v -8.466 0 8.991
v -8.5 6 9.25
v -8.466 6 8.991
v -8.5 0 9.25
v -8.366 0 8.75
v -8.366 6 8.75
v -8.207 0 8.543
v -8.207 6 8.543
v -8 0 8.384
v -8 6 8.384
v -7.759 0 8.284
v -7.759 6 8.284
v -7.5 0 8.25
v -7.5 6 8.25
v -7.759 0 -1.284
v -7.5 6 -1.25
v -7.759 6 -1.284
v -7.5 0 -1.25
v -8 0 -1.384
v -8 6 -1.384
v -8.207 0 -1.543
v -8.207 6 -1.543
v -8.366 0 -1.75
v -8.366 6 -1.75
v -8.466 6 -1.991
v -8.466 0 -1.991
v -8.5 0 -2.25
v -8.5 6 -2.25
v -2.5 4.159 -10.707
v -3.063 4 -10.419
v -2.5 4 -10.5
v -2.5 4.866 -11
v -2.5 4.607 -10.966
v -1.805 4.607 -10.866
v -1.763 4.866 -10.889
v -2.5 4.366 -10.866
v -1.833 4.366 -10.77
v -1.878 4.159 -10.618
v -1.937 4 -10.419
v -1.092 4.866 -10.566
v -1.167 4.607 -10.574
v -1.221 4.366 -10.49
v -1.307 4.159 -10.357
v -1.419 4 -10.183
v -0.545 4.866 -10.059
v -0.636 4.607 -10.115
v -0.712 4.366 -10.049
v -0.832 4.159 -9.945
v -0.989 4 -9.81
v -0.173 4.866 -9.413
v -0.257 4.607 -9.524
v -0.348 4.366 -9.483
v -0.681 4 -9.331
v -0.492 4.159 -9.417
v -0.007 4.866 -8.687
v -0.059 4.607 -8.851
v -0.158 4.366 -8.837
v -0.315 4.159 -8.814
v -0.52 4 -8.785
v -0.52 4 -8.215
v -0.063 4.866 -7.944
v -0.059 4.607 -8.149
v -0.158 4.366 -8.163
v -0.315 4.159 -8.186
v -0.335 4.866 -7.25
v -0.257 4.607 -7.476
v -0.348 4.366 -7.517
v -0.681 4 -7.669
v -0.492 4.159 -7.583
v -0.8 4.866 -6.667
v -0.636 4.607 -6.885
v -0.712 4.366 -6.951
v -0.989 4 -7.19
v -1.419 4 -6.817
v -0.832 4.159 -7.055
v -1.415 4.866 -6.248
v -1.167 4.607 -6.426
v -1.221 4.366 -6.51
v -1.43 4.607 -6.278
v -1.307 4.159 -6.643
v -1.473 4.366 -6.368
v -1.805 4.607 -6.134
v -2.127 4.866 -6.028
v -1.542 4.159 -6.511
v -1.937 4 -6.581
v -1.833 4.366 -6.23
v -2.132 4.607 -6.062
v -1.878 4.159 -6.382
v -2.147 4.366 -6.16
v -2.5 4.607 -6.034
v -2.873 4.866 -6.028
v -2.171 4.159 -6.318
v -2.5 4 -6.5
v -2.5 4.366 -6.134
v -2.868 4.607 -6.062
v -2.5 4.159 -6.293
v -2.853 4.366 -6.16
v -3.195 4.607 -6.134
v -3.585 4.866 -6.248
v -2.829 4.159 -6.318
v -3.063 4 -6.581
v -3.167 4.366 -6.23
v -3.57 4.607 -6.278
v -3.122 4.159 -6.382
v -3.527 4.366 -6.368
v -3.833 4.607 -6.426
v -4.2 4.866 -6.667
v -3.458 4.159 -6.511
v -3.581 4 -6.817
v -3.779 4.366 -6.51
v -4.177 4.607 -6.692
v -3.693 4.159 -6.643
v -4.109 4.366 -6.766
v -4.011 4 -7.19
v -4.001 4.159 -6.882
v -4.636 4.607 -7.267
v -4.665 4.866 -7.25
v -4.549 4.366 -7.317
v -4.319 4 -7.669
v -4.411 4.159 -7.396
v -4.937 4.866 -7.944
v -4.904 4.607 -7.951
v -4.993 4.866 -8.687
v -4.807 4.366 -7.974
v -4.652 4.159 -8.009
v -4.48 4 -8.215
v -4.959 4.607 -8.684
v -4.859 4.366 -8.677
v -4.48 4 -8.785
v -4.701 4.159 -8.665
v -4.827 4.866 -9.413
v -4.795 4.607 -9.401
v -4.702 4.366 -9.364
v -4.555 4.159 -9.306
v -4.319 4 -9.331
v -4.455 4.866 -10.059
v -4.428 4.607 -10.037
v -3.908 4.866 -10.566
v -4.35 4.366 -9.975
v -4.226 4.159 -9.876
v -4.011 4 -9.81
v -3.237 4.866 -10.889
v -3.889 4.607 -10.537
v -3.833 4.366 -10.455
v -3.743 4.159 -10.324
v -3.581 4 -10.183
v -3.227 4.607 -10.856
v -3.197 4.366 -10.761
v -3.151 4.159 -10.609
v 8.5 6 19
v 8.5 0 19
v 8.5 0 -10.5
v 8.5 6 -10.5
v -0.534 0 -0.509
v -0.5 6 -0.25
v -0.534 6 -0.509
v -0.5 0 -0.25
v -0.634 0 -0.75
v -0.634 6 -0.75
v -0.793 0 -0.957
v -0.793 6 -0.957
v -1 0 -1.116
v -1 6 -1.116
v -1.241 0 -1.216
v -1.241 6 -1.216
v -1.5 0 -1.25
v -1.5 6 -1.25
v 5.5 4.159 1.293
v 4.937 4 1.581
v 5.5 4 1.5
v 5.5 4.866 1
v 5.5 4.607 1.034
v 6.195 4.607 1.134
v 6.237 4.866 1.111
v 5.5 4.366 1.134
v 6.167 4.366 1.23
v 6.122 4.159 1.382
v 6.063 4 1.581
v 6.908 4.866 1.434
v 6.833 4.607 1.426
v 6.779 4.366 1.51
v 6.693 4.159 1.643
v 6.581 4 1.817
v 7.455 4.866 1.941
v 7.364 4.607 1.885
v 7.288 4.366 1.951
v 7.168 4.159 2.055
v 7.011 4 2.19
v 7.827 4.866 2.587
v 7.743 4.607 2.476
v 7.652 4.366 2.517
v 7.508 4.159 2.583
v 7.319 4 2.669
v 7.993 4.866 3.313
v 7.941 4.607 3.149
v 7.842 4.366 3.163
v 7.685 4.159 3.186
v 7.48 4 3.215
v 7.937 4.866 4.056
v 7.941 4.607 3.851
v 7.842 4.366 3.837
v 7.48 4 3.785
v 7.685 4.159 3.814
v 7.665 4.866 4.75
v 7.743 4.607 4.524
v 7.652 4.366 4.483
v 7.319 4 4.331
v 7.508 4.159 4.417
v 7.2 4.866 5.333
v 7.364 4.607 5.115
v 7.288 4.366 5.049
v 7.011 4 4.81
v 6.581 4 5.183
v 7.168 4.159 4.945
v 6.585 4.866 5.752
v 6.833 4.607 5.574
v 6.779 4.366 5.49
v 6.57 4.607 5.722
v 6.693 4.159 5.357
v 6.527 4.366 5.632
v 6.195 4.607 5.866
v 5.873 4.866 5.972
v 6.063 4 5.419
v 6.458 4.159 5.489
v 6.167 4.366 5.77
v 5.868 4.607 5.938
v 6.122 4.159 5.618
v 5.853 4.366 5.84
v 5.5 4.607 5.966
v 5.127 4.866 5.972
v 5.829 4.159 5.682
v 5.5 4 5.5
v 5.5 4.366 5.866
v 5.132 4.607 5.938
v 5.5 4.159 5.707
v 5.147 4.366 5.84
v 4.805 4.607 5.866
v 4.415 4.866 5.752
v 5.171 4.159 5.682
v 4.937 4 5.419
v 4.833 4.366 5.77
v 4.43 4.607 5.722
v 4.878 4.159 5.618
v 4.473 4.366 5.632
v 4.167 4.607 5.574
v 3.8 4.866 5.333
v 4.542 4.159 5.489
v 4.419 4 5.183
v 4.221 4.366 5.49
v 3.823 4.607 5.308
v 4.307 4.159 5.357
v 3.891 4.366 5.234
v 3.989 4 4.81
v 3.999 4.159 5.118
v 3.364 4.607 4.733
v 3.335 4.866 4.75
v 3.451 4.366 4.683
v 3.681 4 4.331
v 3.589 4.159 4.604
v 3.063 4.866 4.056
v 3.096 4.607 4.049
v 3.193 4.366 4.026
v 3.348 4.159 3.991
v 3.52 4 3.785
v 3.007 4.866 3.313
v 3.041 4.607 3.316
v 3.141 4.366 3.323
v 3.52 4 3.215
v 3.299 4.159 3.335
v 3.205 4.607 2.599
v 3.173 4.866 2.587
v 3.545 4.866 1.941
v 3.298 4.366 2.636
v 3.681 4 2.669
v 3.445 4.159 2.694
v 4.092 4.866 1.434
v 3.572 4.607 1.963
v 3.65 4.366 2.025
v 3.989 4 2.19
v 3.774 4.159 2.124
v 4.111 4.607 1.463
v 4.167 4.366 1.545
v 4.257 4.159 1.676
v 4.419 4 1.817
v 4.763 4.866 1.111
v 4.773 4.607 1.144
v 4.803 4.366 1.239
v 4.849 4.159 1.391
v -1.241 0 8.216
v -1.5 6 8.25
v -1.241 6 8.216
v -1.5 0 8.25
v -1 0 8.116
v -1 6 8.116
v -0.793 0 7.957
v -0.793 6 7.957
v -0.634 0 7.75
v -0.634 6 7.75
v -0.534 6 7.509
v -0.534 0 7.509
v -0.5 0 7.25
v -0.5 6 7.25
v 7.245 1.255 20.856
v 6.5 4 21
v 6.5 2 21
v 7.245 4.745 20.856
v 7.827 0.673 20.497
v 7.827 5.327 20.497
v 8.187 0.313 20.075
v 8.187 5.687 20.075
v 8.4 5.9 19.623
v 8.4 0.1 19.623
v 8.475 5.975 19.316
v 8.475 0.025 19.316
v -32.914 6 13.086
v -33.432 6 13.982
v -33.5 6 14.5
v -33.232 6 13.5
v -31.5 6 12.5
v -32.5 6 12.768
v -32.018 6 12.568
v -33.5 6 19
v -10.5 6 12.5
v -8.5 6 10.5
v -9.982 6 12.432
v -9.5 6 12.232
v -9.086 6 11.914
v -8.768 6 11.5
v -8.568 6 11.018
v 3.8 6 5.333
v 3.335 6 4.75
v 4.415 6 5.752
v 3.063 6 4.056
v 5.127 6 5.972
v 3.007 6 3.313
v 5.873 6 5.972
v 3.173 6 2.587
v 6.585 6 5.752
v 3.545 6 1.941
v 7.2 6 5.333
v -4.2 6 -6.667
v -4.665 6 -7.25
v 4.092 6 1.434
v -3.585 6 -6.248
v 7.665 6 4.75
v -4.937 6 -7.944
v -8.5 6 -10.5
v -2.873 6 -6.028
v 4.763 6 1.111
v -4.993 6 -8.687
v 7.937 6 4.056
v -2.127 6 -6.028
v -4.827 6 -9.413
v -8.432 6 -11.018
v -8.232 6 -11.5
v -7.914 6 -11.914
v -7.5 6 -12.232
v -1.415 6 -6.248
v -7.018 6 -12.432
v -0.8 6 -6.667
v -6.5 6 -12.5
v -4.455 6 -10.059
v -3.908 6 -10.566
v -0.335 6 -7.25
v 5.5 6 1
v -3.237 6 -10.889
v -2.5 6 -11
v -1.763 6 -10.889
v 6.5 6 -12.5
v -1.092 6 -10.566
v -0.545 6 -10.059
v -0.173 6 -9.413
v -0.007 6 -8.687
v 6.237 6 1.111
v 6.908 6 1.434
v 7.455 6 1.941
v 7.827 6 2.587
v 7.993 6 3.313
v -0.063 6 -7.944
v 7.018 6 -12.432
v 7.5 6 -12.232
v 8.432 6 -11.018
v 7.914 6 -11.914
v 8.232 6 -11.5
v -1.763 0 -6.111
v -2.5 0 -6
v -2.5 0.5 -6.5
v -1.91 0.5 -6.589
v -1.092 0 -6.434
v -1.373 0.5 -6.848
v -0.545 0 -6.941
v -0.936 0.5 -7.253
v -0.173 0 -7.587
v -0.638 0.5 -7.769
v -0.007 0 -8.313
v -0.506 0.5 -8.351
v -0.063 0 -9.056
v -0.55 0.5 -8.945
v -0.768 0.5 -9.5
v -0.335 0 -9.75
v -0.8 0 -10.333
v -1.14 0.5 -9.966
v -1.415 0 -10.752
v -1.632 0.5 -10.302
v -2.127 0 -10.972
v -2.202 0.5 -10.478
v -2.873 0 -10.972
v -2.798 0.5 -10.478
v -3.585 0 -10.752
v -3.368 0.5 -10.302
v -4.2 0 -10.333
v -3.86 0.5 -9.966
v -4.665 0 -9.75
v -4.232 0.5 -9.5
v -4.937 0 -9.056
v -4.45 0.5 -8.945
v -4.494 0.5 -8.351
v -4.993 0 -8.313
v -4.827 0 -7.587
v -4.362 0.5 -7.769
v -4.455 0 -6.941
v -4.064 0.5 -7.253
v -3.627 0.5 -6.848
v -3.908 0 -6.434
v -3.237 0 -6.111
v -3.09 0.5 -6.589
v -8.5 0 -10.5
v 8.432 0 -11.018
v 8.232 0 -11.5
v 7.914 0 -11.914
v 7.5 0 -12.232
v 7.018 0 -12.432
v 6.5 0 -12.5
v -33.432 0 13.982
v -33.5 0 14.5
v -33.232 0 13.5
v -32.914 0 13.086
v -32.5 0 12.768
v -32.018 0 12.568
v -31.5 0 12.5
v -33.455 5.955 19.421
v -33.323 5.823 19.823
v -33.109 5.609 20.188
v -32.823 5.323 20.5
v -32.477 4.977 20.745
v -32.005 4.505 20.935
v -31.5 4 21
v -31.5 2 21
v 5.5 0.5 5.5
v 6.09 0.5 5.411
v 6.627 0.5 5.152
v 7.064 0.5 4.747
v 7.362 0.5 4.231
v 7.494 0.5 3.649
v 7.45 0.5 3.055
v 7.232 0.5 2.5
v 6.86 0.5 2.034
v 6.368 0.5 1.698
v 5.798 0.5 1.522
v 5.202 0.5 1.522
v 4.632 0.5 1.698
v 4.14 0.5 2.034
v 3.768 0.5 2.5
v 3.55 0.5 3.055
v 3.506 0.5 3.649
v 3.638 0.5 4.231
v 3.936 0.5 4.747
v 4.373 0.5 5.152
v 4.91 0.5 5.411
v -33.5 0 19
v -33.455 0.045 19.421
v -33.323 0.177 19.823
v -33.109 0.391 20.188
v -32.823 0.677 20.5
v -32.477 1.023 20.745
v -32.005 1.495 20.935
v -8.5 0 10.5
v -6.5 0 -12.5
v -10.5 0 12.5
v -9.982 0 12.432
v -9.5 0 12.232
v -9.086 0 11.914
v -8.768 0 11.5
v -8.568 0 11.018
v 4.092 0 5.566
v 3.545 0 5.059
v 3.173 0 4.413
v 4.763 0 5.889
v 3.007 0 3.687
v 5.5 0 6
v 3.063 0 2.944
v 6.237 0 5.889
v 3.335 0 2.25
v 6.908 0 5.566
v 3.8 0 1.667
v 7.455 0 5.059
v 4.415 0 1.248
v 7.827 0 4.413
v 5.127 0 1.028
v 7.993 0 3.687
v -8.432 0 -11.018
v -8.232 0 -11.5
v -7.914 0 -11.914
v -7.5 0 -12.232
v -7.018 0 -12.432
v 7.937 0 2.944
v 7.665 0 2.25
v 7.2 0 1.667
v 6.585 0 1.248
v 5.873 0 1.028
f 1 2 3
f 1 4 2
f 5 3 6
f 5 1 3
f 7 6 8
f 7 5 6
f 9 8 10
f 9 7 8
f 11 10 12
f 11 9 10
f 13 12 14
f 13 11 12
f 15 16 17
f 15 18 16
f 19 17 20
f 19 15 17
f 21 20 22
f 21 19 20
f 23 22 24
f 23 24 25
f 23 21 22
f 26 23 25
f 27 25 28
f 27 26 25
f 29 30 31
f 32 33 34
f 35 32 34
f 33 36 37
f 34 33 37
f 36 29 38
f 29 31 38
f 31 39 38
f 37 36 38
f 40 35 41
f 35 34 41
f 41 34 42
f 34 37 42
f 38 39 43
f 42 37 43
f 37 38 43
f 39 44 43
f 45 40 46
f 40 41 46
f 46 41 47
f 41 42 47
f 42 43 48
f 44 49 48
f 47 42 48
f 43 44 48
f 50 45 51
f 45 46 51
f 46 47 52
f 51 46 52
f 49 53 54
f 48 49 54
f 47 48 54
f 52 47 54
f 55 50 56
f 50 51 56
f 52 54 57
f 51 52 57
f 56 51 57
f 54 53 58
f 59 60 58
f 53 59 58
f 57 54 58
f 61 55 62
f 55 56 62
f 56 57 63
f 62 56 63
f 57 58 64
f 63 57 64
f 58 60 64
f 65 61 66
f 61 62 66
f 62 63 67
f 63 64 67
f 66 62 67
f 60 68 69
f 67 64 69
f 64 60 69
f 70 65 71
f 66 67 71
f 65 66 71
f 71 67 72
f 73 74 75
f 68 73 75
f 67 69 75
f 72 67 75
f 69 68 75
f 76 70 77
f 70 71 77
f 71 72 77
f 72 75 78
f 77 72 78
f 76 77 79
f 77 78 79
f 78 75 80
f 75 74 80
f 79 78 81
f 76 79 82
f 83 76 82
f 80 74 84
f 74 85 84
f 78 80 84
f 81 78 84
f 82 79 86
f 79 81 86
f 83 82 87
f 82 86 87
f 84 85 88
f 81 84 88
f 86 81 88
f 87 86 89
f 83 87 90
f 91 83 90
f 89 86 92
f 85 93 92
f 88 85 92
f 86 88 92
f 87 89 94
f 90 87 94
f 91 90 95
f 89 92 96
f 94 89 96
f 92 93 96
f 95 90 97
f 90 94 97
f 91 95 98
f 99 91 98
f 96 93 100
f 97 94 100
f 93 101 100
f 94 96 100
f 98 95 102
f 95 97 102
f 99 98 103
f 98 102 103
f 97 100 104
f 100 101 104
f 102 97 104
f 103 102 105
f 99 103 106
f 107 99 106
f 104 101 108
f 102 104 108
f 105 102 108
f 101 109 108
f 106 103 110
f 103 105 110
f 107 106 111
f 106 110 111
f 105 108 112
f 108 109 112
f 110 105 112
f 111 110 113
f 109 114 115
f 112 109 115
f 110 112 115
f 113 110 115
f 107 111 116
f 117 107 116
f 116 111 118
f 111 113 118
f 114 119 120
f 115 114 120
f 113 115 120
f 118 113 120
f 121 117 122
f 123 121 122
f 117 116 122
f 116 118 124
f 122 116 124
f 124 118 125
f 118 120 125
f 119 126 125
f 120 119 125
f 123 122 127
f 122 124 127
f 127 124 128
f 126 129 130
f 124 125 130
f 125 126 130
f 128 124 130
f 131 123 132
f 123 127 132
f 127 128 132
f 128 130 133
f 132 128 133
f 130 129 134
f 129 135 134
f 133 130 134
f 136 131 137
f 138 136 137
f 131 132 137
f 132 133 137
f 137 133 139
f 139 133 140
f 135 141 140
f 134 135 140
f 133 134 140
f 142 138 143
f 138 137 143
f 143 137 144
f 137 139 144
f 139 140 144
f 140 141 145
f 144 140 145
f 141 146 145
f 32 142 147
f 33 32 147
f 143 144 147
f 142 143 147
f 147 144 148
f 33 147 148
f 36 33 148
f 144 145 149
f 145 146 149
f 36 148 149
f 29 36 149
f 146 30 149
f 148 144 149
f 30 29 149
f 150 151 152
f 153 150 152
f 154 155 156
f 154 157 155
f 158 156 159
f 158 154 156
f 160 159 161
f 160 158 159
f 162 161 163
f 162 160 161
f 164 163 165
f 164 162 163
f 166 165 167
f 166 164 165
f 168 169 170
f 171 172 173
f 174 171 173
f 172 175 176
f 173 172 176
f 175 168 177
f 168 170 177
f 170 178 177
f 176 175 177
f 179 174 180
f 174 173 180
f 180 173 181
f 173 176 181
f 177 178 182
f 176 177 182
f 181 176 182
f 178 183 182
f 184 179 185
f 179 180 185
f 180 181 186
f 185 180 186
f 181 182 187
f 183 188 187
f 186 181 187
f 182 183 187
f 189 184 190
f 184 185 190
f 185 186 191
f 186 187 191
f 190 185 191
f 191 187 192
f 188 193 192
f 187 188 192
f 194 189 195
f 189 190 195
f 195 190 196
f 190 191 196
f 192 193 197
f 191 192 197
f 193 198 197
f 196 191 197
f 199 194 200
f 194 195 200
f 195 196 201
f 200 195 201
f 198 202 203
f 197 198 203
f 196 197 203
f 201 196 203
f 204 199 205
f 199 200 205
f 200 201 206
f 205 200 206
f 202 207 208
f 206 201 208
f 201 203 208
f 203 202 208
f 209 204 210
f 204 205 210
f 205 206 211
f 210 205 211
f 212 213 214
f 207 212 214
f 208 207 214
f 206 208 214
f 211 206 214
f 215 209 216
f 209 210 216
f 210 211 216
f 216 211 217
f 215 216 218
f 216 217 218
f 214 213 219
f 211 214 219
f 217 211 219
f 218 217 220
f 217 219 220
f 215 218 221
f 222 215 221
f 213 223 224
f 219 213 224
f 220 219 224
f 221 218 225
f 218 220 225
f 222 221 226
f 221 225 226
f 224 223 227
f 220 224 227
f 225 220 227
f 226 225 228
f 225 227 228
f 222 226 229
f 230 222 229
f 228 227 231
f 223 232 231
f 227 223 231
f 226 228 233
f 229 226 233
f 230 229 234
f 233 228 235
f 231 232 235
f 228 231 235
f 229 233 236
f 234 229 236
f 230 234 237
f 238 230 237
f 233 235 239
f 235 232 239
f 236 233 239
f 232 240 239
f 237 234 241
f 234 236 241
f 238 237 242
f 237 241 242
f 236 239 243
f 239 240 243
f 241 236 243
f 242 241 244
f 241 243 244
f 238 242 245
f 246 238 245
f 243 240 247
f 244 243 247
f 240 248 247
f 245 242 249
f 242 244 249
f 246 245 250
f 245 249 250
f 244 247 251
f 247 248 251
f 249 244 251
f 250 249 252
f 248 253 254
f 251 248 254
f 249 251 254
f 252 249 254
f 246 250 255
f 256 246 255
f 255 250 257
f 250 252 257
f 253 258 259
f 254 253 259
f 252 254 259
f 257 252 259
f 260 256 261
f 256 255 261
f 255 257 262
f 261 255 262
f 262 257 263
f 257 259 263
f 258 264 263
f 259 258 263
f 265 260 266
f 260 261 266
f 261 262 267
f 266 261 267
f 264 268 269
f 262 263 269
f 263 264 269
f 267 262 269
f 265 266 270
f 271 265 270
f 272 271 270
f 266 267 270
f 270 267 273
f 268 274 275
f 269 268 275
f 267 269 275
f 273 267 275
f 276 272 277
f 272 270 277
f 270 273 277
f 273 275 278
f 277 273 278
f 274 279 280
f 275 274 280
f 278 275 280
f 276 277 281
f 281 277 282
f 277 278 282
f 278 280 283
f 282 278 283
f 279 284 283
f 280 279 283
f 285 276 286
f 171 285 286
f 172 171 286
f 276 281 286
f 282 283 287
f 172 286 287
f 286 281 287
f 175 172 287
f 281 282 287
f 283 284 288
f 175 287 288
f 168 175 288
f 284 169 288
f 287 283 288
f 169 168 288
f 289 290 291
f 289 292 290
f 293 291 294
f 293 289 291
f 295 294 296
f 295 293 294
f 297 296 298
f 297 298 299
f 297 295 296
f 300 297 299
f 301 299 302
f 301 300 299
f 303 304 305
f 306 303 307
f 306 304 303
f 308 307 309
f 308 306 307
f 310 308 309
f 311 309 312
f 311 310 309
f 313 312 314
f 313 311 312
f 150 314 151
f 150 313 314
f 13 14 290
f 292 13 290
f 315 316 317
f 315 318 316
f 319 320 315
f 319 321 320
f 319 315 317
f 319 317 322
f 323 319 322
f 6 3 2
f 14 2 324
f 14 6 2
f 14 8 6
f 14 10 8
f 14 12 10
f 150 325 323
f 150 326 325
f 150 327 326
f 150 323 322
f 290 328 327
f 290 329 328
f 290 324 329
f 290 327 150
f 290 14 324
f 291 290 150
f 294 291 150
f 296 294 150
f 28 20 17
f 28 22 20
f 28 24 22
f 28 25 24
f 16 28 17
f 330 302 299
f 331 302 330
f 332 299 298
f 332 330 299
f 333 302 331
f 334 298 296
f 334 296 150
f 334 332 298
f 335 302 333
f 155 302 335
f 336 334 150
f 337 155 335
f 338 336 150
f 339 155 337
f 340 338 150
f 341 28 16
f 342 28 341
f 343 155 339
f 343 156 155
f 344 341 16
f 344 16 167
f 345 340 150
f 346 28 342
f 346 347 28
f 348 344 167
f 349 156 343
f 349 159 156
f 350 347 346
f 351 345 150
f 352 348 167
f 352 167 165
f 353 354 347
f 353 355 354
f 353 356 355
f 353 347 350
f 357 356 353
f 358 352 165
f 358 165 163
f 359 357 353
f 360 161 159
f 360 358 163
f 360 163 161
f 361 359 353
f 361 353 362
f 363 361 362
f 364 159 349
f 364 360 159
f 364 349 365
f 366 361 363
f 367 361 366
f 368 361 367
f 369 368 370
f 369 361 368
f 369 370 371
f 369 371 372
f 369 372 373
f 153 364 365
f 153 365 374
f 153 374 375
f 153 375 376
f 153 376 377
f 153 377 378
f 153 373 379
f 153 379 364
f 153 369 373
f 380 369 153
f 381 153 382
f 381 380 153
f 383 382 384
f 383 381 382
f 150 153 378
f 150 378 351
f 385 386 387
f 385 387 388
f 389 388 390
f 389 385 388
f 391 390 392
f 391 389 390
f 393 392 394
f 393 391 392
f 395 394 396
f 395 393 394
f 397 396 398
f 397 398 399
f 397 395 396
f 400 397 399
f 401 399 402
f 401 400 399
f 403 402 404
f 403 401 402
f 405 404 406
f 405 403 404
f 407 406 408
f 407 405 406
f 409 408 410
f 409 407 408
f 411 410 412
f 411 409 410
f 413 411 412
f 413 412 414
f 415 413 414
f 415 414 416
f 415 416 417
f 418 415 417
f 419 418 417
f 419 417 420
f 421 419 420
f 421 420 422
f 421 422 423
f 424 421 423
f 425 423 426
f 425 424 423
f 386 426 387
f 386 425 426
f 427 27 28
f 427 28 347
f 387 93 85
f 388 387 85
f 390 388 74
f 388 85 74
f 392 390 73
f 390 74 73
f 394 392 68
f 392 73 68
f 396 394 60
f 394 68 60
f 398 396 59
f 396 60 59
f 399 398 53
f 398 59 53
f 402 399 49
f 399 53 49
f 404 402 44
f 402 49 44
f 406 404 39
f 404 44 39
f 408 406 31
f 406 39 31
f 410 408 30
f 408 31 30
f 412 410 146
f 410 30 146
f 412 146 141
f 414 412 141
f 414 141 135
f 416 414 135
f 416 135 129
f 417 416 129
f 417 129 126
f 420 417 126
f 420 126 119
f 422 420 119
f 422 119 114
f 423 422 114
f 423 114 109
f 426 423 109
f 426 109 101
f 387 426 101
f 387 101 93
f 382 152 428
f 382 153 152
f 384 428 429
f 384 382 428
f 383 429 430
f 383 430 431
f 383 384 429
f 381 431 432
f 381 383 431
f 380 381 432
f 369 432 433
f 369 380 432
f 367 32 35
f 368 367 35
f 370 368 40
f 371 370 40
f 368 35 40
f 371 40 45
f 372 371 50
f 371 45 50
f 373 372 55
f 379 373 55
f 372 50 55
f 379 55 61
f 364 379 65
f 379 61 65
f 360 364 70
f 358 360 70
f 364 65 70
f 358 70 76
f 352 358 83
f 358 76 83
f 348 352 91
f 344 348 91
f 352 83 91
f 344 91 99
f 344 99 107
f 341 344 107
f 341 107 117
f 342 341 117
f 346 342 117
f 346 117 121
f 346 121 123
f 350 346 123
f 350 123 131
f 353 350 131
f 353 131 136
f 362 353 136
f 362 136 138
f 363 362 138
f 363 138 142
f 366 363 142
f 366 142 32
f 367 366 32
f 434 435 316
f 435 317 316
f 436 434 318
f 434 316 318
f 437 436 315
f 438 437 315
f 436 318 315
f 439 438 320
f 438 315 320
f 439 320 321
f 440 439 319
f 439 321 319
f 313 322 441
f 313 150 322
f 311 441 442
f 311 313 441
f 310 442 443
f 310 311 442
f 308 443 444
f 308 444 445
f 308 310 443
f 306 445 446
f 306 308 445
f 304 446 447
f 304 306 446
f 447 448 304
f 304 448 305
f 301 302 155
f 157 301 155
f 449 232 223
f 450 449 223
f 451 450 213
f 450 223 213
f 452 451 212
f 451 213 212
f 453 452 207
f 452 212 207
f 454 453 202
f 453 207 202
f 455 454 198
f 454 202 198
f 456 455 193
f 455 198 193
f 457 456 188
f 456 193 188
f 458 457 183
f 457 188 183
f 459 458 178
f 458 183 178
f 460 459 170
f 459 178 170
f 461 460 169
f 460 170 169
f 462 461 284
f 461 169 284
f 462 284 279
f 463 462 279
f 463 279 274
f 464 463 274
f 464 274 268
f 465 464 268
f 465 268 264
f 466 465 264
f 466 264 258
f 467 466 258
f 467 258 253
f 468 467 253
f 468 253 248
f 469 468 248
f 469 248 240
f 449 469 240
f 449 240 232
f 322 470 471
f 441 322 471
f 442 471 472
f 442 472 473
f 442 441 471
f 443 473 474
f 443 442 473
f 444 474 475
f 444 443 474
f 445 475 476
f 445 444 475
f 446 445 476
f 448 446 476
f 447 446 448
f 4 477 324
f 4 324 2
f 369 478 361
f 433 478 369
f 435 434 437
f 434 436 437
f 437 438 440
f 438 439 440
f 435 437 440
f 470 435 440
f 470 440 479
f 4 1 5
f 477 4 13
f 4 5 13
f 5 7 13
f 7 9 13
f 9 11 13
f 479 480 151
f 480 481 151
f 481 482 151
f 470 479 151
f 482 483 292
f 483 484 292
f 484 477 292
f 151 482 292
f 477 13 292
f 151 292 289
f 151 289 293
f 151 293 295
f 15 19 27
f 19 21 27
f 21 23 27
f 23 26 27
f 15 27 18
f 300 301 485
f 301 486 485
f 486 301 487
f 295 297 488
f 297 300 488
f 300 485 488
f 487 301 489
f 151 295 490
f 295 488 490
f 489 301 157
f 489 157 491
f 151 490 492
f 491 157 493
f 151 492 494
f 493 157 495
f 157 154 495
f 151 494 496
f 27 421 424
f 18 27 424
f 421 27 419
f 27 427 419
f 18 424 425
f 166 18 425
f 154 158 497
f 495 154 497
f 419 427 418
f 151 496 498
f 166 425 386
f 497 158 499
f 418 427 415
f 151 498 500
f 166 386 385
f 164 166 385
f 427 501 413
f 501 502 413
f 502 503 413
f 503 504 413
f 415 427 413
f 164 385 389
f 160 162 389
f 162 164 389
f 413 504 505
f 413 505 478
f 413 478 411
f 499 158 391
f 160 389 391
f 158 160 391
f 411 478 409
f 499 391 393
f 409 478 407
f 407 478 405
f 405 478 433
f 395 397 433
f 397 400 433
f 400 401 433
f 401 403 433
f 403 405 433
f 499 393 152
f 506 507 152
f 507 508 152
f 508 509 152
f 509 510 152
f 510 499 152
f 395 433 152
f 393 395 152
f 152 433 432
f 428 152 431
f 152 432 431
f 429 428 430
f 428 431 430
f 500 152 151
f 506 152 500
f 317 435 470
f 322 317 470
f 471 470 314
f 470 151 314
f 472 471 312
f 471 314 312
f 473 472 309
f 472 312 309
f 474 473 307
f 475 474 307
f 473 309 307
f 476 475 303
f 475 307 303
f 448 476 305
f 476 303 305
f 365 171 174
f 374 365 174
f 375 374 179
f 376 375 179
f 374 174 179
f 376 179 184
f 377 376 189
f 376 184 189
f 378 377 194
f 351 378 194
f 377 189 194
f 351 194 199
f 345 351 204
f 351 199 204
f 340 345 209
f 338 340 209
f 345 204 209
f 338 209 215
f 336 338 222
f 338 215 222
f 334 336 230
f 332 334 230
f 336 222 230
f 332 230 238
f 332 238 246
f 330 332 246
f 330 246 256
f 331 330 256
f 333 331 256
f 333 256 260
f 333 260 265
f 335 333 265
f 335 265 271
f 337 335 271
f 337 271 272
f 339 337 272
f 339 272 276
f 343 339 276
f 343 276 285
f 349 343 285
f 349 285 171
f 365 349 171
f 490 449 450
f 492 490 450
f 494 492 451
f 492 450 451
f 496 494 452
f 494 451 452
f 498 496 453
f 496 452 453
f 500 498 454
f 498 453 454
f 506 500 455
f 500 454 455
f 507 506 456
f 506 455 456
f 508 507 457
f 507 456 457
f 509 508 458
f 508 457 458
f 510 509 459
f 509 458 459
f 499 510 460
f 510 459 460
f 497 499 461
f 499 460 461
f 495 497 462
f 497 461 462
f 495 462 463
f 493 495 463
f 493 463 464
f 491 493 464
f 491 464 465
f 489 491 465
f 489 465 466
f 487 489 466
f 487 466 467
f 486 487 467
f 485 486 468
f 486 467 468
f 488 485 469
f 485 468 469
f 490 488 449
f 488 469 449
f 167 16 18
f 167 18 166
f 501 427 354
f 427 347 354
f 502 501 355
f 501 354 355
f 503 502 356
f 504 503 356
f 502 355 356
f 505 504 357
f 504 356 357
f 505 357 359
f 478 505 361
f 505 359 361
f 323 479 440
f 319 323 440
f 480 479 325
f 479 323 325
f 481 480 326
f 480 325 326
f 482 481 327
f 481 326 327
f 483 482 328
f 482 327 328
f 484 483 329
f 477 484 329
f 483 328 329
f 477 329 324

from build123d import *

# Parameters (mm, degrees)
SKETCH1_W           = 17
SKETCH1_H           = 25
BOSS_EXTRUDE1_DEPTH = 6
SKETCH2_R           = 2
CUT_EXTRUDE1_DEPTH  = 40.990623901
FILLET2_R           = 2
FILLET1_R           = 2
CUT_EXTRUDE2_START  = -4
SKETCH3_R           = 2.5
CUT_EXTRUDE2_DEPTH  = 36.990623901
FILLET3_R           = 1
CHAMFER1_SIZE       = 0.5
SKETCH4_W           = 8
SKETCH4_H           = 9.5
CUT_EXTRUDE3_DEPTH  = 40.990623901
FILLET4_R           = 1


with BuildPart() as part:
    # Sketch1 → Boss-Extrude1 (new body)
    with BuildSketch(Plane(origin=(0, 0, 0), x_dir=(1, 0, 0), z_dir=(0, 1, 0))):
        Polygon((8.5, -12.5), (-8.5, -12.5), (-33.5, -12.5), (-33.5, -21), (8.5, -21), align=None)
        Rectangle(SKETCH1_W, SKETCH1_H)
    extrude(amount=BOSS_EXTRUDE1_DEPTH)

    # Sketch2 → Cut-Extrude1 (cut, through all)
    with BuildSketch(Plane(origin=(0, 6, 0), x_dir=(1, 0, 0), z_dir=(0, 1, 0))):
        with Locations(Location((-2.5, 8.5, 0), (0, 0, 270))):
            Circle(SKETCH2_R)
        with Locations(Location((5.5, -3.5, 0), (0, 0, 270))):
            Circle(SKETCH2_R)
    extrude(amount=-CUT_EXTRUDE1_DEPTH, mode=Mode.SUBTRACT)

    # Fillet2
    fillet2_edges = [part.edges().sort_by_distance(p)[0] for p in [
        (8.5, 3, 21),
        (-33.5, 3, 21),
        (-12.5, 6, 21),
        (-12.5, 0, 21),
    ]]
    fillet(fillet2_edges, radius=FILLET2_R)

    # Fillet1
    fillet1_edges = [part.edges().sort_by_distance(p)[0] for p in [
        (-8.5, 3, 12.5),
        (-8.5, 3, -12.5),
        (8.5, 3, -12.5),
        (-33.5, 3, 12.5),
    ]]
    fillet(fillet1_edges, radius=FILLET1_R)

    # Sketch3 → Cut-Extrude2 (cut, through all)
    with BuildSketch(Plane.XZ.offset(CUT_EXTRUDE2_START)):
        with Locations(Location((5.5, 3.5, 0), (0, 0, 270))):
            Circle(SKETCH3_R)
        with Locations(Location((-2.5, -8.5, 0), (0, 0, 270))):
            Circle(SKETCH3_R)
    extrude(amount=-CUT_EXTRUDE2_DEPTH, mode=Mode.SUBTRACT)

    # Fillet3
    # the kernel refuses this fillet: 1 mm, written as the material it adds along each edge
    with BuildSketch(Plane(origin=(5.5, 4, 3.5), x_dir=(0, 0, -1), z_dir=(-1, 0, 0))) as fillet3_piece_1:
        with BuildLine():
            CenterArc((1.5, -0.866025404), FILLET3_R, 0, 60)
            Line((2.5, -0.866025404), (2.52, -0.866025404))
            Line((2.52, -0.866025404), (2.52, 0))
            Line((2.52, 0), (2.5, 0.02))
            ThreePointArc((2.5, 0.02), (2.25, 0.02), (2.01, 0.017320508))
            Line((2.01, 0.017320508), (2, 0))
        make_face()
    revolve(axis=Axis((5.5, 4, 3.5), (0, -1, 0)))
    with BuildSketch(Plane(origin=(-2.5, 4, -8.5), x_dir=(0, 0, -1), z_dir=(-1, 0, 0))) as fillet3_piece_2:
        with BuildLine():
            CenterArc((1.5, -0.866025404), FILLET3_R, 0, 60)
            Line((2.5, -0.866025404), (2.52, -0.866025404))
            Line((2.52, -0.866025404), (2.52, 0))
            Line((2.52, 0), (2.5, 0.02))
            ThreePointArc((2.5, 0.02), (2.25, 0.02), (2.01, 0.017320508))
            Line((2.01, 0.017320508), (2, 0))
        make_face()
    revolve(axis=Axis((-2.5, 4, -8.5), (0, -1, 0)))

    # Chamfer1
    chamfer1_edges = [part.edges().sort_by_distance(p)[0] for p in [
        (-2.5, 0, -10.5),
        (5.5, 0, 1.5),
    ]]
    chamfer(chamfer1_edges, length=CHAMFER1_SIZE)

    # Sketch4 → Cut-Extrude3 (cut, through all)
    with BuildSketch(Plane(origin=(0, 6, 0), x_dir=(1, 0, 0), z_dir=(0, 1, 0))):
        with Locations((-4.5, -3.5)):
            Rectangle(SKETCH4_W, SKETCH4_H)
    extrude(amount=-CUT_EXTRUDE3_DEPTH, mode=Mode.SUBTRACT)

    # Fillet4
    fillet4_edges = [part.edges().sort_by_distance(p)[0] for p in [
        (-0.5, 3, -1.25),
        (-0.5, 3, 8.25),
        (-8.5, 3, 8.25),
        (-8.5, 3, -1.25),
    ]]
    fillet(fillet4_edges, radius=FILLET4_R)


solid = part.part
